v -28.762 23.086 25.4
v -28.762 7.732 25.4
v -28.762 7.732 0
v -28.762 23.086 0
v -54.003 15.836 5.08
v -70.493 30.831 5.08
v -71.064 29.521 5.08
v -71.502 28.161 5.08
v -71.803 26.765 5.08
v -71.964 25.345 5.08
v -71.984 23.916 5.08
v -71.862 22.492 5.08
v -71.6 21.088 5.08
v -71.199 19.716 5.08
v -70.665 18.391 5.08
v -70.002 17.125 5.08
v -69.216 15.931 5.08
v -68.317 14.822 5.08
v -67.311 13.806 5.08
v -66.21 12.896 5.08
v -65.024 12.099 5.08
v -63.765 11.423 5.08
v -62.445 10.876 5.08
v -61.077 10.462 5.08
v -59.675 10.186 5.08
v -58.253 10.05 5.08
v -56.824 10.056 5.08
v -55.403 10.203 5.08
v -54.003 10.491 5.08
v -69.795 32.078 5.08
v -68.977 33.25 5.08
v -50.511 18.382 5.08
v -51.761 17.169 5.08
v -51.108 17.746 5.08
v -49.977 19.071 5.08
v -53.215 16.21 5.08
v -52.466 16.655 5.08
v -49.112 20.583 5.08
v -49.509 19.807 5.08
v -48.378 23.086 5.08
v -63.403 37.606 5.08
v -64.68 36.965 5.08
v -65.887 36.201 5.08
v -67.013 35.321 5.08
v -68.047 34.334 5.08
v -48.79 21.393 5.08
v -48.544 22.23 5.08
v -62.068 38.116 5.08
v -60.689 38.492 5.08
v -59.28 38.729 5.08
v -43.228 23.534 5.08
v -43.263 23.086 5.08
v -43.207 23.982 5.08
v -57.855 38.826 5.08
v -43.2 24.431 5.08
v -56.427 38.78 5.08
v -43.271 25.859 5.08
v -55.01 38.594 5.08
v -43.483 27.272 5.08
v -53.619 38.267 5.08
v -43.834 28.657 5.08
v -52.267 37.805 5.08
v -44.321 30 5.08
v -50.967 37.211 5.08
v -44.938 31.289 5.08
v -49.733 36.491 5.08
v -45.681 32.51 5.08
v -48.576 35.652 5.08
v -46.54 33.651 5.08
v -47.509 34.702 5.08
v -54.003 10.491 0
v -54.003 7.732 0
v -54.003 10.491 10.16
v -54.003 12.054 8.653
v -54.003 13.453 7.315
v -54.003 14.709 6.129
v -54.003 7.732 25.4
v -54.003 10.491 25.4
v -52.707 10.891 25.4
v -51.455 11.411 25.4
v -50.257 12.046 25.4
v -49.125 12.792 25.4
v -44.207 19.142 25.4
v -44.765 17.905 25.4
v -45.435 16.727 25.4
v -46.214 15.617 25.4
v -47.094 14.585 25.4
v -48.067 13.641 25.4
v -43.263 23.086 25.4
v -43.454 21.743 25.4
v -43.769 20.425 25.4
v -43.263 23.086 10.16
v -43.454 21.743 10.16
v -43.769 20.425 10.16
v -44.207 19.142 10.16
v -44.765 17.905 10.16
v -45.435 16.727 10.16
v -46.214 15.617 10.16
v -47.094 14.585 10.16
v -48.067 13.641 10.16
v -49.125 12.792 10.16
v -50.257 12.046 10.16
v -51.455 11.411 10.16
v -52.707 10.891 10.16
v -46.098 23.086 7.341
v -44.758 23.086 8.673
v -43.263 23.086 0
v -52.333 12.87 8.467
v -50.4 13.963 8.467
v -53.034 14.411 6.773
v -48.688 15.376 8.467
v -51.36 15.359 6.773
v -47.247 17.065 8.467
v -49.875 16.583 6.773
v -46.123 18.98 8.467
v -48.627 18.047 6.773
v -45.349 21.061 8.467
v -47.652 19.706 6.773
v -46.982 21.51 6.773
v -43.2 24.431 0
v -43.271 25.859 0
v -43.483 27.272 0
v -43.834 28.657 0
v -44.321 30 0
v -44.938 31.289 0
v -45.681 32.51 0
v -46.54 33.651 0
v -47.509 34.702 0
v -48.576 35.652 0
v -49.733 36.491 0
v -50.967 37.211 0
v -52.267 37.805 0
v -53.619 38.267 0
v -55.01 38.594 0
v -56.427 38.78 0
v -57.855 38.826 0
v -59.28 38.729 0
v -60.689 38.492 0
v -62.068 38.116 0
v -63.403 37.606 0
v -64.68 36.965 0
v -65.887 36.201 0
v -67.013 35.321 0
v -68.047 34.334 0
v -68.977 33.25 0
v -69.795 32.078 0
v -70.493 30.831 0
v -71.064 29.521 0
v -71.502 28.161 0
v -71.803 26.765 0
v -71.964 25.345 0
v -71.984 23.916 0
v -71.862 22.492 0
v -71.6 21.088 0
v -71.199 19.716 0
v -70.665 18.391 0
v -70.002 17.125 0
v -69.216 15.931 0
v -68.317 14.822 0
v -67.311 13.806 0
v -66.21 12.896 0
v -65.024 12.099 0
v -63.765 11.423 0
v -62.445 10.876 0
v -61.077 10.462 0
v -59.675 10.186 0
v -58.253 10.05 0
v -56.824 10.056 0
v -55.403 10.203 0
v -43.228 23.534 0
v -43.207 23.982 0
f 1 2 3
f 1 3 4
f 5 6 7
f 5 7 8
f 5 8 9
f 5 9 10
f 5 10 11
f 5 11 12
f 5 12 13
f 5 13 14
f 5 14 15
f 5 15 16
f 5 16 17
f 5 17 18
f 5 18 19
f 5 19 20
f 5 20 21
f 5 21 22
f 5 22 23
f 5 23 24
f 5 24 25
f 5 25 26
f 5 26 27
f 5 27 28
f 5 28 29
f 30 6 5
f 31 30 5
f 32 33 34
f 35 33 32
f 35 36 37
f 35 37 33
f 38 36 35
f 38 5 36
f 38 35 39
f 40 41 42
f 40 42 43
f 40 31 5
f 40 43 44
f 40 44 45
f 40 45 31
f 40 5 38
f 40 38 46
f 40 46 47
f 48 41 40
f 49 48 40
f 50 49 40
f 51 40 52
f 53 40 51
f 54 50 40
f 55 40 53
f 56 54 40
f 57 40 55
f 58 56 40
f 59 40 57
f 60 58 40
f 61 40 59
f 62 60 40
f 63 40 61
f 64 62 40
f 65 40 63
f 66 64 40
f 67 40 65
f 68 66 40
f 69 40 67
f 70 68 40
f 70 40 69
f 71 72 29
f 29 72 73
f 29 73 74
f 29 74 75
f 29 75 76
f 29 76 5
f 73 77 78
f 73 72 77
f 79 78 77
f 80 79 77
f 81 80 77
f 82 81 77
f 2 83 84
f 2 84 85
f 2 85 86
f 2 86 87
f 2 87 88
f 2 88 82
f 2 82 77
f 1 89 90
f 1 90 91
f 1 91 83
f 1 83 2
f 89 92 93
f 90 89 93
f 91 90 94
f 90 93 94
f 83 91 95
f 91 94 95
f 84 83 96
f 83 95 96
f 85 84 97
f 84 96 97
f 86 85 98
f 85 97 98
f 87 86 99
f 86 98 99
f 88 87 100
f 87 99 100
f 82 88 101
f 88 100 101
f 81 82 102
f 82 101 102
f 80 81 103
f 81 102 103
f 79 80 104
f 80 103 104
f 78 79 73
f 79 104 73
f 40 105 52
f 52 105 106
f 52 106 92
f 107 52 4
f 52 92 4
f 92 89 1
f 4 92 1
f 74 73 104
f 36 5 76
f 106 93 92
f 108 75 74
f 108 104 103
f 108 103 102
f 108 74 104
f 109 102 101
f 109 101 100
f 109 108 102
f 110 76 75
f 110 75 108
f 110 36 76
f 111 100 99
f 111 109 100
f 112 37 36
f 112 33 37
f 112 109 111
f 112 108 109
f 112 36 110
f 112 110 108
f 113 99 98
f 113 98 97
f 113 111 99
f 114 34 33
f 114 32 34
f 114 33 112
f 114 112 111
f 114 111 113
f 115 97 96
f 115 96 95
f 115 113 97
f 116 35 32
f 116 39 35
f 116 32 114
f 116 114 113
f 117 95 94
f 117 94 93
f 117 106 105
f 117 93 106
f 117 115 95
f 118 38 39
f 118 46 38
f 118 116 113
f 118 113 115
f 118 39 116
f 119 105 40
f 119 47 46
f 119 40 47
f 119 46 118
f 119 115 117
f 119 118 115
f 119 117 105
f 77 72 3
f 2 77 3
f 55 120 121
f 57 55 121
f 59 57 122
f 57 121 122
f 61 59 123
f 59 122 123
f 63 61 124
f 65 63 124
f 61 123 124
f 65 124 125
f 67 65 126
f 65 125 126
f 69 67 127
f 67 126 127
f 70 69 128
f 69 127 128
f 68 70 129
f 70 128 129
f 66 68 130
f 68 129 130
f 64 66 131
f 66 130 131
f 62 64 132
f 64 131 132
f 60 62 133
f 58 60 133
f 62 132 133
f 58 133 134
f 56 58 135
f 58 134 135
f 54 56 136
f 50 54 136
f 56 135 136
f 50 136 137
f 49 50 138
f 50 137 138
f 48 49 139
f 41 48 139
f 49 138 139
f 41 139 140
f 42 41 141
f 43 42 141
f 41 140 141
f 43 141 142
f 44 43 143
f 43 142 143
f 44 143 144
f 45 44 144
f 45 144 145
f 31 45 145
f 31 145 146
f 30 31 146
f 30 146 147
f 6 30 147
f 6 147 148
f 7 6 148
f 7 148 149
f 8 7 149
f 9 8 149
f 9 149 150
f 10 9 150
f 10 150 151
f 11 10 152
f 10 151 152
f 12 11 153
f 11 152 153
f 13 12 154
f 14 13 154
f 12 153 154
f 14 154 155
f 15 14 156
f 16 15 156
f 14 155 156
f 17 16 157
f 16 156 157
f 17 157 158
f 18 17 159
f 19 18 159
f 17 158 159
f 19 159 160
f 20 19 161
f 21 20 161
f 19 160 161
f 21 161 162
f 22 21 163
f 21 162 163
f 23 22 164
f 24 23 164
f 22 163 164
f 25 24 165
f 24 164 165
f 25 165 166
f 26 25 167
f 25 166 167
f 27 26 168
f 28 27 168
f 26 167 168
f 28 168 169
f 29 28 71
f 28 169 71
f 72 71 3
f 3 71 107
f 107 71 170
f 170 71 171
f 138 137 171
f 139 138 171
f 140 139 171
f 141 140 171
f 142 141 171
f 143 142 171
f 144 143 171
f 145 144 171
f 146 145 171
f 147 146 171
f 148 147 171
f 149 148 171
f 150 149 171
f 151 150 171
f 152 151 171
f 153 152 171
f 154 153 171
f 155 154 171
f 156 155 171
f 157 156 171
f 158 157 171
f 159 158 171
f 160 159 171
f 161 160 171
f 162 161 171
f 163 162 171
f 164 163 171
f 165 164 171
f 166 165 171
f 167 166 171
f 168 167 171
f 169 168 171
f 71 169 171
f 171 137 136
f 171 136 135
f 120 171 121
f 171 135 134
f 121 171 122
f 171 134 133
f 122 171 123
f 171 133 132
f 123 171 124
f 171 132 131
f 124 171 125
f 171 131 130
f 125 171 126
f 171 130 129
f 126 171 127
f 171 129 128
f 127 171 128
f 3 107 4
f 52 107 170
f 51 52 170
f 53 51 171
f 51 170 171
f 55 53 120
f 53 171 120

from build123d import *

# Parameters (mm, degrees)
F1_DEPTH    = 25.4
F2_DEPTH    = 5.08
F3_T4_ANGLE = 174.1930400009


# Not quite as in the source:
# - a fillet or chamfer that OpenCascade refuses, or shapes differently, is made with other operations: its cross-section is extruded or revolved along the edge and cut away or added


with BuildPart() as f1:
    # F0 (on Top) → F1 (new body)
    with BuildSketch(Plane.XY):
        with BuildLine():
            Line((-28.7617053837, 23.086078465), (-43.2633440317, 23.086078465))
            ThreePointArc((-43.2633440317, 23.086078465), (-46.6420182582, 15.0906140017), (-54.0029779077, 10.4907048123))
            Line((-54.0029779077, 10.4907048123), (-54.0029779077, 7.7324733138))
            Line((-54.0029779077, 7.7324733138), (-28.7617053837, 7.7324733138))
            Line((-28.7617053837, 7.7324733138), (-28.7617053837, 23.086078465))
        make_face()
    extrude(amount=F1_DEPTH)

    # F0 (on Top) → F2 (join)
    with BuildSketch(Plane.XY):
        with BuildLine():
            Line((-54.0029779077, 10.4907048123), (-54.0029779077, 23.086078465))
            Line((-54.0029779077, 23.086078465), (-43.2633440317, 23.086078465))
            ThreePointArc((-43.2633440317, 23.086078465), (-43.2161007803, 23.7580355867), (-43.2003415292, 24.4314670563))
            ThreePointArc((-43.2003415292, 24.4314670563), (-68.9767505511, 33.249655712), (-54.0029779077, 10.4907048123))
        make_face()
        with BuildLine():
            Line((-43.2633440317, 23.086078465), (-54.0029779077, 23.086078465))
            Line((-54.0029779077, 23.086078465), (-54.0029779077, 10.4907048123))
            ThreePointArc((-54.0029779077, 10.4907048123), (-46.6420182582, 15.0906140017), (-43.2633440317, 23.086078465))
        make_face()
    extrude(amount=F2_DEPTH)

    # F3: chamfer of 5.08 on 1 edges, made by hand


with BuildPart() as f3_tool2:
    # F3_s3 → F3_t4 (revolve)
    with BuildSketch(Plane(origin=(-48.0088326829, 36.9045281739, 0), x_dir=(0, 0, 1), z_dir=(-0.7928262046, 0.6094477905, 0))):
        Polygon((10.16, -30.128971911), (5.08, -25.048971911), (5.08, -30.128971911), align=None)
    revolve(axis=Axis((-57.5969107449, 24.4314670563, 5.08), (0, 0, 1)), revolution_arc=F3_T4_ANGLE)

    split(bisect_by=Plane.XZ.offset(-23.086078465), keep=Keep.TOP)

    split(bisect_by=Plane.YZ.offset(-54.0029779077), keep=Keep.TOP)


with BuildPart() as f1_1:
    add(f1.part)

    # F3_t1: union F3_tool2
    add(f3_tool2.part)


solid = f1_1.part
